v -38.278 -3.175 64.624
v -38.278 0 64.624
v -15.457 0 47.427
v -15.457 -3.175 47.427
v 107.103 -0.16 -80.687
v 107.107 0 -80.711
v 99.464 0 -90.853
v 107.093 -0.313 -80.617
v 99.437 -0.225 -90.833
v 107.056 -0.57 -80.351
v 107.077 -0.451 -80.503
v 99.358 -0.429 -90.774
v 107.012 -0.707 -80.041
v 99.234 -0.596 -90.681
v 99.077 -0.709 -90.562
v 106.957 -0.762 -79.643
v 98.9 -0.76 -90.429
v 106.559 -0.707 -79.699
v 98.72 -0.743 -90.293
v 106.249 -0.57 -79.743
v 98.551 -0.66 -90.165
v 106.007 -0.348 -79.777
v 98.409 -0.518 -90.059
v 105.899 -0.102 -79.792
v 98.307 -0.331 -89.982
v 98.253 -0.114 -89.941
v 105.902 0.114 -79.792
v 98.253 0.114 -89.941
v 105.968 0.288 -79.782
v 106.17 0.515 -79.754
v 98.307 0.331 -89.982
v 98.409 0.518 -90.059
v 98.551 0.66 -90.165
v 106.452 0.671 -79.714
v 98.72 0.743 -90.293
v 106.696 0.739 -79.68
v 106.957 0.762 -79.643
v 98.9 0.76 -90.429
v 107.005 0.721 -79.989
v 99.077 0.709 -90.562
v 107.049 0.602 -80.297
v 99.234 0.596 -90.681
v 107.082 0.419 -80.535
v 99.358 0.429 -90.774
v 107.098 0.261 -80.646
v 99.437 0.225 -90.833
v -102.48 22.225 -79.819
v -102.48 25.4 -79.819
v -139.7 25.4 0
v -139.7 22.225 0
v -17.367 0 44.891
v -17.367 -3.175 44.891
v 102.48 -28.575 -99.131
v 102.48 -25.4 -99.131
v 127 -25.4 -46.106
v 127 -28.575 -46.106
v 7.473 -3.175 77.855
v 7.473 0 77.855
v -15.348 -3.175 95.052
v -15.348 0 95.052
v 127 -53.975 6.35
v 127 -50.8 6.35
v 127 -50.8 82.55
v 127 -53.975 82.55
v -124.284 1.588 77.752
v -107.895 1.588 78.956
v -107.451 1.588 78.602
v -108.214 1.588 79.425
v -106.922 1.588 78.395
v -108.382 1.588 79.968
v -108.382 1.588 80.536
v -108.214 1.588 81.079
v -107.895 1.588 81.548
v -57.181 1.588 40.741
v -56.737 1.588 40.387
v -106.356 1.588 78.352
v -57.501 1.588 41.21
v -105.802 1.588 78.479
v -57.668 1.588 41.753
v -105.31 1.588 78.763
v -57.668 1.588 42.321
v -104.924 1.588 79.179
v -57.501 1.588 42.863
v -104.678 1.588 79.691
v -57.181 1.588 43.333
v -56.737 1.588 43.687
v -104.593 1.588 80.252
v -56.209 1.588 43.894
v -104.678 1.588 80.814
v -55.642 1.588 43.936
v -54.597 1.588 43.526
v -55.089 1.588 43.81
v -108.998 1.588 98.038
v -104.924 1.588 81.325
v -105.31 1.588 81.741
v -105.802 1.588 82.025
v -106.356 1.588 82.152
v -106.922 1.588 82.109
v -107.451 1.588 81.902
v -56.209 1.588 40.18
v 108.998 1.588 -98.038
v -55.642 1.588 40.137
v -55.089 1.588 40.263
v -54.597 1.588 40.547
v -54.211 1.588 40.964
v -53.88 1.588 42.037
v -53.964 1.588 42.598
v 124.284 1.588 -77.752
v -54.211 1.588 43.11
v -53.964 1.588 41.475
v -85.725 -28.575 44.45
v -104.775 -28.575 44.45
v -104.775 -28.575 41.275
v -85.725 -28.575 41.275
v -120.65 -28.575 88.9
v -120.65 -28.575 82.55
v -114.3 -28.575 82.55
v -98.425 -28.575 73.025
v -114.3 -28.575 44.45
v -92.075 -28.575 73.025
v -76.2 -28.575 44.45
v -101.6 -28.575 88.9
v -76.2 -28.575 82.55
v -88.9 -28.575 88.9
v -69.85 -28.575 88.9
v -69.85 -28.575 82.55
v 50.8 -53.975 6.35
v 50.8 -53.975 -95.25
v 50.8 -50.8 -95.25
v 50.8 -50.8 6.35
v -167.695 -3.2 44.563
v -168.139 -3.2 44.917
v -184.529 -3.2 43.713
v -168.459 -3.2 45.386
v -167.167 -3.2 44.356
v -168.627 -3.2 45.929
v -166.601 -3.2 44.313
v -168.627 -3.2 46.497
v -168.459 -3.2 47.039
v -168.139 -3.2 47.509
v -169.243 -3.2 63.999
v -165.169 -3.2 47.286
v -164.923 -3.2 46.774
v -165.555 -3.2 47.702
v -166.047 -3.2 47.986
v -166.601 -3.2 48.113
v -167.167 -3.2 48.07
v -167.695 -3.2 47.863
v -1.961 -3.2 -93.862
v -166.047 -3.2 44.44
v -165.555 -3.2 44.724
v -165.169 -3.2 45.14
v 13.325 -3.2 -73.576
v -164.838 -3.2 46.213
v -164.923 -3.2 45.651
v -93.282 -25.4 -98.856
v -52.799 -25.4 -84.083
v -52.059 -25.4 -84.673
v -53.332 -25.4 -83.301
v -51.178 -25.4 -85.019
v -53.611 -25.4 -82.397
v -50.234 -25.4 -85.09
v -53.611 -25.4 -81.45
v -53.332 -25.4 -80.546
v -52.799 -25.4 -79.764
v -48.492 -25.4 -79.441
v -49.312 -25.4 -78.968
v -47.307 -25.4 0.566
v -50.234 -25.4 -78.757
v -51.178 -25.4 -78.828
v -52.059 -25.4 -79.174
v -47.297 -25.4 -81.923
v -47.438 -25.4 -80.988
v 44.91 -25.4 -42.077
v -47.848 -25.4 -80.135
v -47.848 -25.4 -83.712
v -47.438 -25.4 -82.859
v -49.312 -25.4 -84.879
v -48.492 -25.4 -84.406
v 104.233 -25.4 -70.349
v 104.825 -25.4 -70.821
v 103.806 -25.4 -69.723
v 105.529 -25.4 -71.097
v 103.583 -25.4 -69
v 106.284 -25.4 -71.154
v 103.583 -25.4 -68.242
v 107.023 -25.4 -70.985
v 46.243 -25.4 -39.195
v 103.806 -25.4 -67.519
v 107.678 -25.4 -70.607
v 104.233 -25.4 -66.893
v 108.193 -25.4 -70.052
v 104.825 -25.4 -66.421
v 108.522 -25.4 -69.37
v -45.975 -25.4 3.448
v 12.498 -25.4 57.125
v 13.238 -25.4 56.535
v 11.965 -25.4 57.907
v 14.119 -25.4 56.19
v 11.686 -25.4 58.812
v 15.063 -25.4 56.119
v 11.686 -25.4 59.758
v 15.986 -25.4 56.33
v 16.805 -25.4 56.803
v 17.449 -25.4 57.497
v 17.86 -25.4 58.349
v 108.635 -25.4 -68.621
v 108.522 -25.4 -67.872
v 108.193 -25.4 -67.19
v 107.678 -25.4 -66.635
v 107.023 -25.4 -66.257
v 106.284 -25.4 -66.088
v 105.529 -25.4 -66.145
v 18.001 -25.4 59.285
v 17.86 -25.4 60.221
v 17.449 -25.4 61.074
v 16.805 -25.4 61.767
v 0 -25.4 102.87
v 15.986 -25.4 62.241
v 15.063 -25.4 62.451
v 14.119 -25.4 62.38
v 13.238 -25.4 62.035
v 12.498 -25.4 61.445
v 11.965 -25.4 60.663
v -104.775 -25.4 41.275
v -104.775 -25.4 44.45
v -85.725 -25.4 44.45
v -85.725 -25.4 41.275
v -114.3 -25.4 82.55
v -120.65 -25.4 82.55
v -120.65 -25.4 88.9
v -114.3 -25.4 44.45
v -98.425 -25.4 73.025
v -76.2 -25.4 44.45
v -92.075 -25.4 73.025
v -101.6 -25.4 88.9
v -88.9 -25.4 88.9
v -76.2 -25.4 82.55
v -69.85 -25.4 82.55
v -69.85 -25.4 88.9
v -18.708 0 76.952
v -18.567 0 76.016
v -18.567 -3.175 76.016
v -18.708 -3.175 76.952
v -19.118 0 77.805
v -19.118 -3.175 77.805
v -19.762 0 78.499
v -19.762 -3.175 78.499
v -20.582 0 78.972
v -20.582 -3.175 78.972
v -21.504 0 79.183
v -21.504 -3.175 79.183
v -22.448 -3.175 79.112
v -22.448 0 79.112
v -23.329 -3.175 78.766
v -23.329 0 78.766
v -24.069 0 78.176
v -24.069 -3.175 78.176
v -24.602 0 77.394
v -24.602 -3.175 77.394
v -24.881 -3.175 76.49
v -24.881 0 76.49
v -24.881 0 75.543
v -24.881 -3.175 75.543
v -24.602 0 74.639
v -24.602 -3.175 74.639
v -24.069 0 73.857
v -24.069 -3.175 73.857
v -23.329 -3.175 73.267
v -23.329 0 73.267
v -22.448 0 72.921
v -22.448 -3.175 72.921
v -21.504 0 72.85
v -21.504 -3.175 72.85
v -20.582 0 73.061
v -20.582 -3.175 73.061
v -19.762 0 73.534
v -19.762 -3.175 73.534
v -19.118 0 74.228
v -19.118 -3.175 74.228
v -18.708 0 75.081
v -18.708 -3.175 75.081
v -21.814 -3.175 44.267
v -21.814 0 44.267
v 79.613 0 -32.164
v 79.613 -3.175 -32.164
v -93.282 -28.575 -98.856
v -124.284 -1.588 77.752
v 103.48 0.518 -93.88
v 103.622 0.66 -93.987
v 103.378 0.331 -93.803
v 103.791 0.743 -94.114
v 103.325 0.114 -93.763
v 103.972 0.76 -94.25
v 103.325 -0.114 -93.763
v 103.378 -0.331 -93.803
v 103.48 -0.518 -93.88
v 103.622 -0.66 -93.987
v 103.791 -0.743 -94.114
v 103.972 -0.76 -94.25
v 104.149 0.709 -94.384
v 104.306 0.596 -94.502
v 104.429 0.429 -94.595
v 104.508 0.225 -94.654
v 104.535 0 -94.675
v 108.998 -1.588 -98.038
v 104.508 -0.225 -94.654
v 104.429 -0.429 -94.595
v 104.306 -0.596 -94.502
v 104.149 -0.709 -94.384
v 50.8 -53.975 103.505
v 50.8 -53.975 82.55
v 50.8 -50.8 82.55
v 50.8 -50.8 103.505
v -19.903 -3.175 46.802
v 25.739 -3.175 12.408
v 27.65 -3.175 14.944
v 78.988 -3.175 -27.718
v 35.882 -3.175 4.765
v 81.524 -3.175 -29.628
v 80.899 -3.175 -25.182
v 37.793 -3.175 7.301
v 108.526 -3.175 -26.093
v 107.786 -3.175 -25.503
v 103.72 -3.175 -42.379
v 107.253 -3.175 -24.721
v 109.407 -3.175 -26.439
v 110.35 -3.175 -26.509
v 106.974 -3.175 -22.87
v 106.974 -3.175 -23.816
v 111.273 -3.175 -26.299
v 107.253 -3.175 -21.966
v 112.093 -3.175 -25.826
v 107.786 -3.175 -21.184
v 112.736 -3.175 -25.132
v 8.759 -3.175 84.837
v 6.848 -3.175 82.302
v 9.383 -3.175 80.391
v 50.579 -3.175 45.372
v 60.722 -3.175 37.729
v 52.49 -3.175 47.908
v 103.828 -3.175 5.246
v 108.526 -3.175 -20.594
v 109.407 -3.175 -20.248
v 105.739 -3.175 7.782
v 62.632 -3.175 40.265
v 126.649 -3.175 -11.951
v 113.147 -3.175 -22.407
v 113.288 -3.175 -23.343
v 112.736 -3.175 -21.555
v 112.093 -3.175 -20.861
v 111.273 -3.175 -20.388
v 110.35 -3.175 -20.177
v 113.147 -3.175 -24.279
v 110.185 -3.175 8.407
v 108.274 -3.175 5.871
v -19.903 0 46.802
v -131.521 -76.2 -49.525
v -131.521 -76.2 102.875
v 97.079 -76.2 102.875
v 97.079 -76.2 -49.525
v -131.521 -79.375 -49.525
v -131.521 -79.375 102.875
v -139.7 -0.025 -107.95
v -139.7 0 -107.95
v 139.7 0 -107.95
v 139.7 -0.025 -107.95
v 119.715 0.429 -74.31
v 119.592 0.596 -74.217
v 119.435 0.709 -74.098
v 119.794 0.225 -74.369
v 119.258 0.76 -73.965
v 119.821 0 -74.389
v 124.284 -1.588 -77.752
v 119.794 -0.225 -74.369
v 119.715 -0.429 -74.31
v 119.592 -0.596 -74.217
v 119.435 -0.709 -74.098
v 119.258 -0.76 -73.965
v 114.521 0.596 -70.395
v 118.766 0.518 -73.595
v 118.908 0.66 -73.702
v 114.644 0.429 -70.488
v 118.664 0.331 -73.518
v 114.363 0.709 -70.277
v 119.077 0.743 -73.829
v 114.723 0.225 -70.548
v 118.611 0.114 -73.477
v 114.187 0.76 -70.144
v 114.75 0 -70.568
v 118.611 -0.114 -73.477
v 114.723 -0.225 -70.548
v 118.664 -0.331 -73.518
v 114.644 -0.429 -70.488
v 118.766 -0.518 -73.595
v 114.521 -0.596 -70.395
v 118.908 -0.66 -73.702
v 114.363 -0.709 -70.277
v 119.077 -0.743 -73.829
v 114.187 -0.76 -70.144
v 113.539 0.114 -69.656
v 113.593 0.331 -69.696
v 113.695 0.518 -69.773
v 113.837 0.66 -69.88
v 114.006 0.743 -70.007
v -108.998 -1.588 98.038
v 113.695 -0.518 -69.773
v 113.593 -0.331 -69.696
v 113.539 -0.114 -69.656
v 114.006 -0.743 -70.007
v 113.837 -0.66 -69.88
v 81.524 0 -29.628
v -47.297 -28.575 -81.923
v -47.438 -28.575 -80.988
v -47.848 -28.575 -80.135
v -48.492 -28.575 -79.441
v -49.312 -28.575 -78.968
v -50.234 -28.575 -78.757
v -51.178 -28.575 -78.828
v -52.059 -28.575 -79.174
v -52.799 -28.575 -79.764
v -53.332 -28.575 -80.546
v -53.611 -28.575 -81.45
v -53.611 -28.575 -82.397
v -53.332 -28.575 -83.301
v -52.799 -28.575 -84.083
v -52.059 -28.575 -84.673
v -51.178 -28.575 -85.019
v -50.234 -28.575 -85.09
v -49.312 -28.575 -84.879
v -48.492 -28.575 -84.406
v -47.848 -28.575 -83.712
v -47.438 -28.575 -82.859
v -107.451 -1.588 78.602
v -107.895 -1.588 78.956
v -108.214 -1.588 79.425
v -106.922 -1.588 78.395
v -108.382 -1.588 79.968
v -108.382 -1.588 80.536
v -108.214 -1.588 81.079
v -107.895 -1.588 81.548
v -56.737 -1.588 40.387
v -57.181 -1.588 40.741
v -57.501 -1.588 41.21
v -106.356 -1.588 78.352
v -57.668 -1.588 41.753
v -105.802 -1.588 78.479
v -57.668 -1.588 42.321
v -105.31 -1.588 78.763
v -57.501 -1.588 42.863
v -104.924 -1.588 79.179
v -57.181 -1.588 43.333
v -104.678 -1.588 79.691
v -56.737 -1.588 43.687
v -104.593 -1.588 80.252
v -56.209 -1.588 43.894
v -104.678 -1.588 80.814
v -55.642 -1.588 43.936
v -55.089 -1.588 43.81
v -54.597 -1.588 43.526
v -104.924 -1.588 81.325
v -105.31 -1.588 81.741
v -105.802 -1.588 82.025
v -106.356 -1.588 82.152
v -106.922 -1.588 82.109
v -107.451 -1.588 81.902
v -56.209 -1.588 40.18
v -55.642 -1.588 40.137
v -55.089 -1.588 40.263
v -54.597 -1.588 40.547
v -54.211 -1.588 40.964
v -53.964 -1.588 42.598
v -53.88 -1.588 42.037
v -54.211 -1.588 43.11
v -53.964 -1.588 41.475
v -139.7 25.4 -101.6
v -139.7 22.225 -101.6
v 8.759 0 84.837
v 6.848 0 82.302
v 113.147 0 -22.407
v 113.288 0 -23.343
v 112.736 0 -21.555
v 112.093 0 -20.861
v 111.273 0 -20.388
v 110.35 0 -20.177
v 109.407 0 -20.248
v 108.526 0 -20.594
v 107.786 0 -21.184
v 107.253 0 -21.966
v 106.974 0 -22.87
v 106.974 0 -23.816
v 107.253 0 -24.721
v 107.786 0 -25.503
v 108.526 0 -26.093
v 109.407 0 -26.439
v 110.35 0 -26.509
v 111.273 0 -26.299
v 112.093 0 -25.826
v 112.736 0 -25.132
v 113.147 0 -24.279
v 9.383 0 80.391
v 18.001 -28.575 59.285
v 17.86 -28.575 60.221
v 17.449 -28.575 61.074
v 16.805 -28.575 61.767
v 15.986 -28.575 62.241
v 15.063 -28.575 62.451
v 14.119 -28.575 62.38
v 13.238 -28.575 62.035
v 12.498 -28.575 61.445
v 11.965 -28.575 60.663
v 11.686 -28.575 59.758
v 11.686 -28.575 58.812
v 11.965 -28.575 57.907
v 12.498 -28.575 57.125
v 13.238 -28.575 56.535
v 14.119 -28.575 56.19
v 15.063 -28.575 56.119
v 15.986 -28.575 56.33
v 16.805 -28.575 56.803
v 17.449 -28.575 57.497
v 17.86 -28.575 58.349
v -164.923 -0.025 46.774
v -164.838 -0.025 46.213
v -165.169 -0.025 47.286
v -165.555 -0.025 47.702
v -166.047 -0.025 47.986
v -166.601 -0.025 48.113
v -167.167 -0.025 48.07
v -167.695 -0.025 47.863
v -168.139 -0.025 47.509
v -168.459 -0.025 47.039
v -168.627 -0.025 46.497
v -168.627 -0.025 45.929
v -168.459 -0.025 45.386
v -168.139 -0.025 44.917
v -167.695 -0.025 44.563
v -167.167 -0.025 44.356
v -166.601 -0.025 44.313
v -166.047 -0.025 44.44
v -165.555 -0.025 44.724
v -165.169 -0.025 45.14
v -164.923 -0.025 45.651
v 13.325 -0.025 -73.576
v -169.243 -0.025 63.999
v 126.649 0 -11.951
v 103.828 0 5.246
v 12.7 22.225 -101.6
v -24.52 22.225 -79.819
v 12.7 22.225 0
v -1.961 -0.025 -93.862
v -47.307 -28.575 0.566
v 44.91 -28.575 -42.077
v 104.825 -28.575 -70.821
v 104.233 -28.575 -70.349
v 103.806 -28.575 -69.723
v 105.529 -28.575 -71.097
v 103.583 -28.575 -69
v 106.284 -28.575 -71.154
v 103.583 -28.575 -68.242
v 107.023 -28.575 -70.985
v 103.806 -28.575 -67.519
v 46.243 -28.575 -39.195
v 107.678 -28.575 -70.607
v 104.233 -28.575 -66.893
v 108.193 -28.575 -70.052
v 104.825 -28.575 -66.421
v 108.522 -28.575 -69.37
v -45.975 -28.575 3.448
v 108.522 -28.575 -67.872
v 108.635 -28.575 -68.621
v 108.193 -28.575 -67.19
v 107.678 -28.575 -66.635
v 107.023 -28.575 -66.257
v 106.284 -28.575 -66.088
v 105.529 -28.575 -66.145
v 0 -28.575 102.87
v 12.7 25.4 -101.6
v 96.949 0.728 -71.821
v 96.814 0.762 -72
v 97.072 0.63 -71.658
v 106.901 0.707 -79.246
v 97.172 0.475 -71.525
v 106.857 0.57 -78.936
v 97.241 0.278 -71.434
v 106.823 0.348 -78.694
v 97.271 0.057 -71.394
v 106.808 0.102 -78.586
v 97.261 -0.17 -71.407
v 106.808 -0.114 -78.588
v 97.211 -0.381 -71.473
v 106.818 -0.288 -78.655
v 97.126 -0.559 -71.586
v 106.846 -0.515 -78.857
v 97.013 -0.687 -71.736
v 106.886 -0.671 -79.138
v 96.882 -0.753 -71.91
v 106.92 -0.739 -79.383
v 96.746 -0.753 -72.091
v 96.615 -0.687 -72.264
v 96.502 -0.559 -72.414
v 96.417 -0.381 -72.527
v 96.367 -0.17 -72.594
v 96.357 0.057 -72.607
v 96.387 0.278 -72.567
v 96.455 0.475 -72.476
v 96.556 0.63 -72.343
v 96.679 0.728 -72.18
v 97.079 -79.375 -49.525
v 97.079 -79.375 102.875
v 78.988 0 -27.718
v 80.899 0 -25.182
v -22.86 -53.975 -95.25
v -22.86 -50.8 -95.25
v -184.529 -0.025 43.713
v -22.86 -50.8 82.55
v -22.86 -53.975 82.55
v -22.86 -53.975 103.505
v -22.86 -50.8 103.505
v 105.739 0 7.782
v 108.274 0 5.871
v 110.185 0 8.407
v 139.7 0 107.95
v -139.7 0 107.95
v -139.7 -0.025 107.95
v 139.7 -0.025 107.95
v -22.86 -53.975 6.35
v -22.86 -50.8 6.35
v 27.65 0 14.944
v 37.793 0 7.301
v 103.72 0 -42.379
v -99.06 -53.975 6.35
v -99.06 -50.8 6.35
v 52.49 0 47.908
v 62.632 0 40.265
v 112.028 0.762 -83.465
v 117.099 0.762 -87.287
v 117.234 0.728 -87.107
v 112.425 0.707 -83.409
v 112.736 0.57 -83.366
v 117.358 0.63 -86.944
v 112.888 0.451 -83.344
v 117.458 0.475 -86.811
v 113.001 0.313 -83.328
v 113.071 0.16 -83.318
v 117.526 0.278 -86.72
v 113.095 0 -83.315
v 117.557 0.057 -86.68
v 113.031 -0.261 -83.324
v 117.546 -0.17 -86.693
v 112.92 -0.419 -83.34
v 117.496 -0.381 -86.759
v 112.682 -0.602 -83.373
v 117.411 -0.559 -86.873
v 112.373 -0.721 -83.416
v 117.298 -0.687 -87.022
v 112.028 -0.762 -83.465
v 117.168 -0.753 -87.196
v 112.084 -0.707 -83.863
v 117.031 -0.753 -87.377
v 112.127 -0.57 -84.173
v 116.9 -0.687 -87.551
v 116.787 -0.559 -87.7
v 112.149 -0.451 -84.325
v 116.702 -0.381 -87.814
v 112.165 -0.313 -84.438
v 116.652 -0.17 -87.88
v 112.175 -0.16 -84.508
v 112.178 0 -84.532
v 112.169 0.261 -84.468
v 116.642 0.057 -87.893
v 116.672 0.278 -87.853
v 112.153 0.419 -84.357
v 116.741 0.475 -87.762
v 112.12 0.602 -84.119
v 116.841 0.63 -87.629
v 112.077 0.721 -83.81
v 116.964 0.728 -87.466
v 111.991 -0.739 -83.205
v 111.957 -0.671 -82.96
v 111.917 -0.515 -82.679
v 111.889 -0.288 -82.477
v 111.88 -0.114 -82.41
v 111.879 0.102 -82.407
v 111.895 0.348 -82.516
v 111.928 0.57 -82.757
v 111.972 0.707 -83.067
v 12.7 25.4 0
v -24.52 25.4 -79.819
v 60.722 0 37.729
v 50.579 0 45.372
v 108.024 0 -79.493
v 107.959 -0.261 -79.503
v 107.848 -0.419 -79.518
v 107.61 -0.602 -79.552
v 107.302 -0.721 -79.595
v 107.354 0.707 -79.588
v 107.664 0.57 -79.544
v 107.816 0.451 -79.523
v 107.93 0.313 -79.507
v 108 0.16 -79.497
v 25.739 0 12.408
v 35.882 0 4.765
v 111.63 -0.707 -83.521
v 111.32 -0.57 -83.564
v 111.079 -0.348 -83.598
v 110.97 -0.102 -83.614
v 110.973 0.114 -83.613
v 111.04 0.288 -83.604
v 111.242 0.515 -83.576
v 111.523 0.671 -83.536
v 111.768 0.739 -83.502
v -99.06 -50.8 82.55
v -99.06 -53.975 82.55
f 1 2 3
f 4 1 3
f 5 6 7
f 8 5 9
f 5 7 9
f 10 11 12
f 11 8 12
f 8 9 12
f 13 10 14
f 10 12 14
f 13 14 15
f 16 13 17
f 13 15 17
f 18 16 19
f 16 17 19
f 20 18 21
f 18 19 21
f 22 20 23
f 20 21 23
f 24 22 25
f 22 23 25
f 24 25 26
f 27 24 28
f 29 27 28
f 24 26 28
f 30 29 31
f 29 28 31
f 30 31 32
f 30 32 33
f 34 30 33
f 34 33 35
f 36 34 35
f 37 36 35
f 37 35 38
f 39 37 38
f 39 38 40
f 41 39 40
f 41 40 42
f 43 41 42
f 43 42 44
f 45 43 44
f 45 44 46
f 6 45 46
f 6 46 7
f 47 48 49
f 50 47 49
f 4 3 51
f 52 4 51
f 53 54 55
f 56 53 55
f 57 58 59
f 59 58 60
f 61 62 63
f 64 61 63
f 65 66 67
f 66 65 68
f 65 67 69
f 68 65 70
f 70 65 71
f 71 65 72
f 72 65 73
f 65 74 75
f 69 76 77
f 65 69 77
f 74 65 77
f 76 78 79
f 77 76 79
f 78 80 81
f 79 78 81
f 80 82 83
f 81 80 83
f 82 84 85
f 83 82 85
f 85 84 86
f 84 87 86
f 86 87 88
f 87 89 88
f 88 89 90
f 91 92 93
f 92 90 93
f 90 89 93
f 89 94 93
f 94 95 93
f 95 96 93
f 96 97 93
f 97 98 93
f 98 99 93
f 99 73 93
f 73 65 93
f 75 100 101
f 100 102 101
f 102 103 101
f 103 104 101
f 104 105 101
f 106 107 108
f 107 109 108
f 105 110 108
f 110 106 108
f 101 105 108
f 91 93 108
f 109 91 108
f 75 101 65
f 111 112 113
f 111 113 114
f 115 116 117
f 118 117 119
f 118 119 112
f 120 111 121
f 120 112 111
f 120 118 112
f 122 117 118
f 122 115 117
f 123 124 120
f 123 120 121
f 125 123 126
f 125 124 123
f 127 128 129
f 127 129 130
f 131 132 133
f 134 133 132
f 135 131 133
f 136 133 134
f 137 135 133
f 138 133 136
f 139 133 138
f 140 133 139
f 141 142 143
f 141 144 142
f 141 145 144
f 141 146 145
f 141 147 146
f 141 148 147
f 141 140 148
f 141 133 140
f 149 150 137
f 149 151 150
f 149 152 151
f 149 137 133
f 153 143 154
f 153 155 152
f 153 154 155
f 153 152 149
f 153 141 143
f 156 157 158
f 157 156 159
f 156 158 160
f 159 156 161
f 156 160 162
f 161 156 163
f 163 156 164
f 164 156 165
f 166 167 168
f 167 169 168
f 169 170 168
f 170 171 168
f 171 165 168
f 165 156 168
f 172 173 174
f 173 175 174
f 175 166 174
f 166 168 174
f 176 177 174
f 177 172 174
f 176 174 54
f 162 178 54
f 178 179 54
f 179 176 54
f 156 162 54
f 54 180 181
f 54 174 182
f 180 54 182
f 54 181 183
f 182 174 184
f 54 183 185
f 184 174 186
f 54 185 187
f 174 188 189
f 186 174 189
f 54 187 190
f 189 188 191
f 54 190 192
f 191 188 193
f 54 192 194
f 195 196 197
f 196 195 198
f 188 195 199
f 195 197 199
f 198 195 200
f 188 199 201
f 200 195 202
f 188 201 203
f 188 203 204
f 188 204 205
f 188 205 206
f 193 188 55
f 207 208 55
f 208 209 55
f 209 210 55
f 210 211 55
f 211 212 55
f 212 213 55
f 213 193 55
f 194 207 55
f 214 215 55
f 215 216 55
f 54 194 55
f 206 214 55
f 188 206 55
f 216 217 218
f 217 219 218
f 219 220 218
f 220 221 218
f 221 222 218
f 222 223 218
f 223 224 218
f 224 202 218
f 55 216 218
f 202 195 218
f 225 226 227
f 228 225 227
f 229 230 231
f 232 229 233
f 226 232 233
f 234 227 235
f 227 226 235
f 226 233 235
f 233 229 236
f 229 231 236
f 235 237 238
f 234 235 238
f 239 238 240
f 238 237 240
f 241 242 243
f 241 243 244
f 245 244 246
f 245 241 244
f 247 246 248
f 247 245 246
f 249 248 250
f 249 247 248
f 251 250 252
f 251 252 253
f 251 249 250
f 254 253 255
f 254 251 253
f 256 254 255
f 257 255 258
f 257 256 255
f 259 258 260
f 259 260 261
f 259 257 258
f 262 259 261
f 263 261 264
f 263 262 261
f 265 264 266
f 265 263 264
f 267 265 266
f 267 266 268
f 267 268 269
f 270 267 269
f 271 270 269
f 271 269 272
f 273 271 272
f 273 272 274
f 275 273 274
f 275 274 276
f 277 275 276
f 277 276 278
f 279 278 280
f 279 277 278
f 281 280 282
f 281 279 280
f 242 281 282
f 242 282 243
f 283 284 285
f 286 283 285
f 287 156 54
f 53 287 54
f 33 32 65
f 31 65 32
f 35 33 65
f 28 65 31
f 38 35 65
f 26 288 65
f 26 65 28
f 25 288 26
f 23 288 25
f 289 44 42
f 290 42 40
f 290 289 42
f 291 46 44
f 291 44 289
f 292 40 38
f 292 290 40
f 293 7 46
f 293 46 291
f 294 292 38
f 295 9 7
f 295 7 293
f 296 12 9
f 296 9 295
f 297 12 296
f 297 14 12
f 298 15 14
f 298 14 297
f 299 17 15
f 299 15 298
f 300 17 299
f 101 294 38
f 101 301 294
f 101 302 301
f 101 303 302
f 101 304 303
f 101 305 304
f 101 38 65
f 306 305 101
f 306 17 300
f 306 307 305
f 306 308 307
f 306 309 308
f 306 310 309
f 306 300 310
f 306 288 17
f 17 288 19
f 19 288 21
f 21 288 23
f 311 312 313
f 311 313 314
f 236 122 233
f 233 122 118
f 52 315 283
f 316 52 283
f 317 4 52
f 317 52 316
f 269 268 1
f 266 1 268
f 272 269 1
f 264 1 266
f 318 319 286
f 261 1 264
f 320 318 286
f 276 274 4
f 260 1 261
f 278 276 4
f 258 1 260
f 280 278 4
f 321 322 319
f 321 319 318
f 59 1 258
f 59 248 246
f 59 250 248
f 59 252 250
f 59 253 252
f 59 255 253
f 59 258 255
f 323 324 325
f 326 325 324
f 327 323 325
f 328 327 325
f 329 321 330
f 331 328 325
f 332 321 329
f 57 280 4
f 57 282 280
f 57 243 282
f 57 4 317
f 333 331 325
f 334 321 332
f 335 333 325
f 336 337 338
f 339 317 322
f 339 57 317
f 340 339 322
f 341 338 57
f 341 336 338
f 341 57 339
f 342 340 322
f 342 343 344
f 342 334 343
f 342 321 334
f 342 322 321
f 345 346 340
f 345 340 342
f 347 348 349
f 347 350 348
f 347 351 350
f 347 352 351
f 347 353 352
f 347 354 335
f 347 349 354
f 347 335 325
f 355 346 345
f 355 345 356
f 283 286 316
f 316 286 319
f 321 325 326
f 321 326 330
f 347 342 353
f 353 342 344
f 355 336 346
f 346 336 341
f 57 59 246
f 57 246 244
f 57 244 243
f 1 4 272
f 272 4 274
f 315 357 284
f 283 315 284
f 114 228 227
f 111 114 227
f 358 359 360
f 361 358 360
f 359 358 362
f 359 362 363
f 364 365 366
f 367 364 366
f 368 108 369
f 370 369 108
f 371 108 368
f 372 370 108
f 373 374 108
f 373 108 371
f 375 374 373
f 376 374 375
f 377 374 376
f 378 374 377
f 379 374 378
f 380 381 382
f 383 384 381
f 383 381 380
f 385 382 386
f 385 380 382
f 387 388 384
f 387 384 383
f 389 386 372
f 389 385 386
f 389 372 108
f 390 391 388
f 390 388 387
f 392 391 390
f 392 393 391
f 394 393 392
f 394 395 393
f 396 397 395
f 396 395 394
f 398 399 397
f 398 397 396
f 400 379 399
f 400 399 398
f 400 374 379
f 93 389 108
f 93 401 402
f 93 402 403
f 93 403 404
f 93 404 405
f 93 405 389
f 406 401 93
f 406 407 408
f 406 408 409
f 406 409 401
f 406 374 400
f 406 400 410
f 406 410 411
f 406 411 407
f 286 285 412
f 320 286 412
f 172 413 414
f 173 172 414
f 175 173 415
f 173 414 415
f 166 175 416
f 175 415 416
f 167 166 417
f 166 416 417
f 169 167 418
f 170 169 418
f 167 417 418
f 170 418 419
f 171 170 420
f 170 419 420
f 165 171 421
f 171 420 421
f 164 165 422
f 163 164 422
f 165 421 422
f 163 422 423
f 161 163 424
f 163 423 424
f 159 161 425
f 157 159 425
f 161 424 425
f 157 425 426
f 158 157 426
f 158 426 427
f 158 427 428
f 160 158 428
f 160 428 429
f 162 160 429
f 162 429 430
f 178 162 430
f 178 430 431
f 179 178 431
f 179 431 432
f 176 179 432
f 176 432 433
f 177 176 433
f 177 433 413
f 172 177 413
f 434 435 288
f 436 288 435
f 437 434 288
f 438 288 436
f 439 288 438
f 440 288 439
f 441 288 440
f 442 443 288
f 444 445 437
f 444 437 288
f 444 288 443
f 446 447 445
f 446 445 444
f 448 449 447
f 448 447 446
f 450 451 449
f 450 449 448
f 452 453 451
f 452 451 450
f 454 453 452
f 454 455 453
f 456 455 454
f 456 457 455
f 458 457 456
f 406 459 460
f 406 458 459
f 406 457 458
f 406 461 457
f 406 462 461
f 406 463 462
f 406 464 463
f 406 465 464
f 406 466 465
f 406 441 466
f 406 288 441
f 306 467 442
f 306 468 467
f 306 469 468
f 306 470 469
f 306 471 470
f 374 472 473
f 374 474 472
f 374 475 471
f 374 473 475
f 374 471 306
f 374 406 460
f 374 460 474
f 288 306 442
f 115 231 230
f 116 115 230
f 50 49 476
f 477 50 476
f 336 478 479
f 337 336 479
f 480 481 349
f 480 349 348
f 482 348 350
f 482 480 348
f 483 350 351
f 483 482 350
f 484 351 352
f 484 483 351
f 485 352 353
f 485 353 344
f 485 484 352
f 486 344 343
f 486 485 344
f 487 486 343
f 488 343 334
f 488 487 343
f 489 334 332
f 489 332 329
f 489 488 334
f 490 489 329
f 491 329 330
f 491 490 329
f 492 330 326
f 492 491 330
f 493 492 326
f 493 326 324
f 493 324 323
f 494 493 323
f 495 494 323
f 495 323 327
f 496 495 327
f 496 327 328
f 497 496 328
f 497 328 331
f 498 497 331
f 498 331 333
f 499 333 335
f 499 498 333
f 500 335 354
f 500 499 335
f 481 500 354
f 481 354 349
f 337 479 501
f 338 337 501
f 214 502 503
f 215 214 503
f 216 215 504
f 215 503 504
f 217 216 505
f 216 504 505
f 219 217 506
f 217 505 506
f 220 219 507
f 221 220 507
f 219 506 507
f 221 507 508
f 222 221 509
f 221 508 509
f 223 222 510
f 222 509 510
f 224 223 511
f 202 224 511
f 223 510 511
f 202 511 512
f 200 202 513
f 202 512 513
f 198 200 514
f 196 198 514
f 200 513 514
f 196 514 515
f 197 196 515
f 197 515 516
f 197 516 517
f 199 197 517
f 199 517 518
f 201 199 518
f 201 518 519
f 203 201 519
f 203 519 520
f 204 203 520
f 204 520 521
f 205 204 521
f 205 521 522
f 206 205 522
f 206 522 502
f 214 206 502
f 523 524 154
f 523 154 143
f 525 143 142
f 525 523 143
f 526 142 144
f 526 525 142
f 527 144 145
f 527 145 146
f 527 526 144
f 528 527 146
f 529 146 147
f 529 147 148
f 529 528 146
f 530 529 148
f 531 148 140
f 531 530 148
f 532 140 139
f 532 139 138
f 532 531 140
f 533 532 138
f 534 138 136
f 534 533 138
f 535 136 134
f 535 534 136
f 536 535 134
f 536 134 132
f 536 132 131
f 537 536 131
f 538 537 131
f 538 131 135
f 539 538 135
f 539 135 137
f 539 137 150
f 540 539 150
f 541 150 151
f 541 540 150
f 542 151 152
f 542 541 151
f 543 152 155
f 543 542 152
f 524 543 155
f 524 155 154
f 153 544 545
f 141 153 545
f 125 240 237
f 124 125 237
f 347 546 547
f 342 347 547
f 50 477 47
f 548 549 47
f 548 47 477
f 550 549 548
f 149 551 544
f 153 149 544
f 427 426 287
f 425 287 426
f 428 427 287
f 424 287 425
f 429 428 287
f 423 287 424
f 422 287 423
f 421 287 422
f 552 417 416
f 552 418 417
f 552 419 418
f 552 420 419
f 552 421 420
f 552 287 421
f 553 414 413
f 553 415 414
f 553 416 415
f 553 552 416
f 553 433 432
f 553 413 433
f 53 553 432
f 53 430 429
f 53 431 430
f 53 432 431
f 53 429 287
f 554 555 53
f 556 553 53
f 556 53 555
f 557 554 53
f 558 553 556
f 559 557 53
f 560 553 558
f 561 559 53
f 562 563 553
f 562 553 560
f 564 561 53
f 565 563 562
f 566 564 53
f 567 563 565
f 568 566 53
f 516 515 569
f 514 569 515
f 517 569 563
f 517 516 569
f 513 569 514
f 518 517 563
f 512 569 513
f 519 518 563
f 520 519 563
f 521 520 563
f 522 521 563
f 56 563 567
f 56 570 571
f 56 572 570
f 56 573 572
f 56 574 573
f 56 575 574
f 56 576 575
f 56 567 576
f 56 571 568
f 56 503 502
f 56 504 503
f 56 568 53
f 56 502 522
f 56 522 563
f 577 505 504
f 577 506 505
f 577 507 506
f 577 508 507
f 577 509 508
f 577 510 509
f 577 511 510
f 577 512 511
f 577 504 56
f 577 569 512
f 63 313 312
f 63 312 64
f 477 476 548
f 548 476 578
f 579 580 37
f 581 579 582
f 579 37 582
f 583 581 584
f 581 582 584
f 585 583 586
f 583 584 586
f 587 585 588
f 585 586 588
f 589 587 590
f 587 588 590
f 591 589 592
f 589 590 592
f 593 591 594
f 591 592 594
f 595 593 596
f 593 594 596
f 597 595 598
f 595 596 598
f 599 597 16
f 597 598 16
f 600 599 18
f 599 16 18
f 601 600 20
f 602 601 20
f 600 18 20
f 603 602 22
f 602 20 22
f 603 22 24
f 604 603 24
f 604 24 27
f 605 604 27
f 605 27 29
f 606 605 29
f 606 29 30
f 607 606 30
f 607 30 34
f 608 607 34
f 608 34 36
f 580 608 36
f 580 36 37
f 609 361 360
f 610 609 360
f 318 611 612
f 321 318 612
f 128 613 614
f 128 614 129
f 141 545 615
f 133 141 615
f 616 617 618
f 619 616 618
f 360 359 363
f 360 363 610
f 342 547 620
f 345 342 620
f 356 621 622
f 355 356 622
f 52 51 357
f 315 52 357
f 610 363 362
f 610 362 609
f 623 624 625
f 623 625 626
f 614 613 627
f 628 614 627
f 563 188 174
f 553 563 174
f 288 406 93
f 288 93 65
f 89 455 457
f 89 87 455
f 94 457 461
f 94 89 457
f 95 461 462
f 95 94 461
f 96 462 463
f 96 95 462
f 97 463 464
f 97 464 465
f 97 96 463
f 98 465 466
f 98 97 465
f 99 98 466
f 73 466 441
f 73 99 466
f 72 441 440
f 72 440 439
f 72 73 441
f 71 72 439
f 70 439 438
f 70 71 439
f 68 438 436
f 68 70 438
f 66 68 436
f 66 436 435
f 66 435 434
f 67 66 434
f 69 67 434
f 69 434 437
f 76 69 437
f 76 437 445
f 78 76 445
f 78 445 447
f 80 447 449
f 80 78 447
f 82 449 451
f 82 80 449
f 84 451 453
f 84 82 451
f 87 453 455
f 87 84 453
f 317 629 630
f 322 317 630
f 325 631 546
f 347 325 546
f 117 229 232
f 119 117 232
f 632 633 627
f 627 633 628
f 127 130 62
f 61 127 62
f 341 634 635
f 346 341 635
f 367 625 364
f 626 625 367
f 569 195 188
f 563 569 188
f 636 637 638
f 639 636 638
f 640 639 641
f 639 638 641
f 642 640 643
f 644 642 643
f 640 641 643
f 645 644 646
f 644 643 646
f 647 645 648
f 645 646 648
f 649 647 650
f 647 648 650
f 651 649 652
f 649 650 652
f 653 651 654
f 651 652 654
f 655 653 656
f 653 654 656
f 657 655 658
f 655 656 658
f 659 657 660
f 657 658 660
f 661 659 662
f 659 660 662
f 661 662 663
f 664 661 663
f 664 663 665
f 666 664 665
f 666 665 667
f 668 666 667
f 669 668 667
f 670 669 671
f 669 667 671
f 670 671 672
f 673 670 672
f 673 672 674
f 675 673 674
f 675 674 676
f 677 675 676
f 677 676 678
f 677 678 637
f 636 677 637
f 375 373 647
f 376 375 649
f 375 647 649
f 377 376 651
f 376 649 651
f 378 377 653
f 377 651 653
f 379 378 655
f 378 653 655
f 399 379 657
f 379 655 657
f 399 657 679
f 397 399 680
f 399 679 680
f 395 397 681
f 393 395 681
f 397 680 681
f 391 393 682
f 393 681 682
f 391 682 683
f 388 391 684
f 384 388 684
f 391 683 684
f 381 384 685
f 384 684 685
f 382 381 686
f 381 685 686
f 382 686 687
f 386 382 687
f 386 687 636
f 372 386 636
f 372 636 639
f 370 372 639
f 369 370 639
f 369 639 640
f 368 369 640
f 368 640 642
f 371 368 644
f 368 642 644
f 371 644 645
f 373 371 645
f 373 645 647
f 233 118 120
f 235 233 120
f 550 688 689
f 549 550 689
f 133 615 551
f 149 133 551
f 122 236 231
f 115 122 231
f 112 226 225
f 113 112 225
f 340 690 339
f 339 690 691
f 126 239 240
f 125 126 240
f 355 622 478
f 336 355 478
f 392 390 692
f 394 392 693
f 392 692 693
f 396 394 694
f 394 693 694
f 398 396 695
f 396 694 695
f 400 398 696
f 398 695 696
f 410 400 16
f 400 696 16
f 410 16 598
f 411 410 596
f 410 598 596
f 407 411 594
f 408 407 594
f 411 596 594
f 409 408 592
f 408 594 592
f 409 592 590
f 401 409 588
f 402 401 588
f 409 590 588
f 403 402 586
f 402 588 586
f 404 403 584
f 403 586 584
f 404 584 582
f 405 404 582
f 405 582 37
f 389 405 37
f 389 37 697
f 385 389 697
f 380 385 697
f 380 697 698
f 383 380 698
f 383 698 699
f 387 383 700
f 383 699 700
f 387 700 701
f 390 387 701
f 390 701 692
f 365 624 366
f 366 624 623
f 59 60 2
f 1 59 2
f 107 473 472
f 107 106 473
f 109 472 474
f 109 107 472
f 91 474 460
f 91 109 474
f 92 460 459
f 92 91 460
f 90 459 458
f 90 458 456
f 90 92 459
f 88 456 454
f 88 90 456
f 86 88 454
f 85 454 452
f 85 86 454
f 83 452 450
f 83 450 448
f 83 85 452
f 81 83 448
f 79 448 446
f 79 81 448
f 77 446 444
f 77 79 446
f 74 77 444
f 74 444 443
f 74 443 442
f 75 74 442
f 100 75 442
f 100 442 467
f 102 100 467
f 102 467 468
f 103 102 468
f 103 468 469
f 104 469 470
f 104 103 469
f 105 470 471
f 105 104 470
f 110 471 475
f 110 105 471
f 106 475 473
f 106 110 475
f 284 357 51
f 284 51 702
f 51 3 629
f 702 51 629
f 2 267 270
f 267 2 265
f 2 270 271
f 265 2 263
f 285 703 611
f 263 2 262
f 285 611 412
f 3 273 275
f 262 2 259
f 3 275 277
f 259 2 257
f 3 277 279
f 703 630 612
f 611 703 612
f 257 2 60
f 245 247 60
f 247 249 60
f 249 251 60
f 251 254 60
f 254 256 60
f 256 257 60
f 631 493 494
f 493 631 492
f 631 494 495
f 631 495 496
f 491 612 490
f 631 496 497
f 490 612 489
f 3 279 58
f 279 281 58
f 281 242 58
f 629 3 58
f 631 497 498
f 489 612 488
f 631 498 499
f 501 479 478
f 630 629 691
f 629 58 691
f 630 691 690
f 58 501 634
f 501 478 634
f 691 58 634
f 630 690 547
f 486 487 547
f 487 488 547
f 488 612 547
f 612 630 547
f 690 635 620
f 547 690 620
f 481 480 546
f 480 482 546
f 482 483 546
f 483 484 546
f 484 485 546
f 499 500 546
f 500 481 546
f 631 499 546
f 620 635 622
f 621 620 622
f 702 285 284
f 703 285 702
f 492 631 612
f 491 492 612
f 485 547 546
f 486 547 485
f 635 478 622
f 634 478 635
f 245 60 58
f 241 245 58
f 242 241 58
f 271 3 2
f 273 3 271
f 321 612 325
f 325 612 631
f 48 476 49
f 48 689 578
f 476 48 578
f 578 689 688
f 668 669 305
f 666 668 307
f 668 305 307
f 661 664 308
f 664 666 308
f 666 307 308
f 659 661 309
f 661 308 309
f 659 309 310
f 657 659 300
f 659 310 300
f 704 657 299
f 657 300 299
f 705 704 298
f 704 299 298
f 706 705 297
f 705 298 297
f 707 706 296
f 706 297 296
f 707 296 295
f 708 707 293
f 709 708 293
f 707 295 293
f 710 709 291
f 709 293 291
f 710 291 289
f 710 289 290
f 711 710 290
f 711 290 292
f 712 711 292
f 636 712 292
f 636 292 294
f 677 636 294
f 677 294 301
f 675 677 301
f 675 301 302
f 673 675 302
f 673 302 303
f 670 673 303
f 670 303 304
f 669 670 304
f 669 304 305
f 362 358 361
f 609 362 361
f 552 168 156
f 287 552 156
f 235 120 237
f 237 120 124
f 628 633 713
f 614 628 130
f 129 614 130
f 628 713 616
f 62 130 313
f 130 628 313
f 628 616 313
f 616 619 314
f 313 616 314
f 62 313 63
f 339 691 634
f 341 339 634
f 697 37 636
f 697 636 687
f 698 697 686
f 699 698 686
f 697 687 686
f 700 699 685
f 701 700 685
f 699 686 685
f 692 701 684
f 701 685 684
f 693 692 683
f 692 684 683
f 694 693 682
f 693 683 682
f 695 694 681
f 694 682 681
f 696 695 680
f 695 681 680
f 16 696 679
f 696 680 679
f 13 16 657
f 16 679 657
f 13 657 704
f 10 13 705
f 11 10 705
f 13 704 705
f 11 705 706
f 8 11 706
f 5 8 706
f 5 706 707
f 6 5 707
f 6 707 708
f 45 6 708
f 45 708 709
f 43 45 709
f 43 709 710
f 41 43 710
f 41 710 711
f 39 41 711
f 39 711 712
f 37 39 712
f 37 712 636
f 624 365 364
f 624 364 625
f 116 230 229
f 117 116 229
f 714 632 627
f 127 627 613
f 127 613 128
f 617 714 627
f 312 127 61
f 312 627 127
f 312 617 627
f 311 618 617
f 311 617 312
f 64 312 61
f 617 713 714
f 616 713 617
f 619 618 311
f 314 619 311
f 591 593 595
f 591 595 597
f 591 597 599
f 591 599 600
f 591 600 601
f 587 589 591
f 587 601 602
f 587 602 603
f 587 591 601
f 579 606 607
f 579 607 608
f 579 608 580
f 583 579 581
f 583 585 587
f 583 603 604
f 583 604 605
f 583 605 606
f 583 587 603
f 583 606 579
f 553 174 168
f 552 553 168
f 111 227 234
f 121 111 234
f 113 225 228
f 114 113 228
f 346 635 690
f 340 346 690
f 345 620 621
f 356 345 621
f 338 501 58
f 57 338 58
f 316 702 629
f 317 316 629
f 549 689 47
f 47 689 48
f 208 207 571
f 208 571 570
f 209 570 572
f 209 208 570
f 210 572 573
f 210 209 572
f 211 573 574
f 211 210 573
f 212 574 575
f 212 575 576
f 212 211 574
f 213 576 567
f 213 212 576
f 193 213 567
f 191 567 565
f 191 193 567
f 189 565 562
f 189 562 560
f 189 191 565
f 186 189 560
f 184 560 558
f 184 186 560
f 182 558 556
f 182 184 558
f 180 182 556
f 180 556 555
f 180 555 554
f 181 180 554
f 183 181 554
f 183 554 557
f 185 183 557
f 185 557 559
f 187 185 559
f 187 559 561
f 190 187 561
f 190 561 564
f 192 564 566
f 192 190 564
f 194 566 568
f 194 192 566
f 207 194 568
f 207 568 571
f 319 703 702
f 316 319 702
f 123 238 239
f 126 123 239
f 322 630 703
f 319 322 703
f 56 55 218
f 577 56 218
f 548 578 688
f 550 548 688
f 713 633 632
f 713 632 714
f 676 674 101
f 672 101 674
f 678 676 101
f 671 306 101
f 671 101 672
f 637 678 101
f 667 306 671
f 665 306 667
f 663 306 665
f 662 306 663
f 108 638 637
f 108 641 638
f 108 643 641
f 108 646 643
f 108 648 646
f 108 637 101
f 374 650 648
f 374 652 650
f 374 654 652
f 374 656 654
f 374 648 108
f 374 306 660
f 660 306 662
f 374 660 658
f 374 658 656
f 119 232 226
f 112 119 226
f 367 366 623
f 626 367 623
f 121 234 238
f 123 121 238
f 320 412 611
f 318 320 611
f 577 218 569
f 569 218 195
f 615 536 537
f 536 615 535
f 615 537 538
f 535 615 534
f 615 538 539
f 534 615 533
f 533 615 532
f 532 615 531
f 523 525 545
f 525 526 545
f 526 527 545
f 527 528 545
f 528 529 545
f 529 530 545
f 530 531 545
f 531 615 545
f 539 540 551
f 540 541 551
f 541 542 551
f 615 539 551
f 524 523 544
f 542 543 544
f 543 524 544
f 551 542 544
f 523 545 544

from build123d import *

# Parameters (mm, degrees)
F1_R      = 1.905
F2_DEPTH  = 1.5875
F4_R      = 2.54
F5_DEPTH  = 3.175
F7_DEPTH  = 3.175
F8_R      = 3.175
F9_DEPTH  = 3.175
F12_DEPTH = 3.175
F14_W     = 226.06
F14_H     = 76.2
F15_DEPTH = 3.175
F17_DEPTH = 53.976
F19_W     = 228.6
F19_H     = 152.4
F20_DEPTH = 3.175
F21_W     = 73.66
F21_H     = 198.755
F22_DEPTH = 3.175
F23_R     = 3.175
F24_DEPTH = 53.976
F0_W      = 279.4
F0_H      = 215.9
F25_DEPTH = 0.0254
F26_R     = 1.905
F27_DEPTH = 3.175
F28_R     = 0.762
F29_DEPTH = 25.4
F30_R     = 0.762
F31_DEPTH = 182.9872620439


with BuildPart() as f2:
    # F1 (on Front) → F2 (new body, symmetric)
    with BuildSketch(Plane.XZ):
        Polygon((124.2837670364, -77.7524131538), (-108.9976654484, 98.037755109), (-124.2837670364, 77.7524131538), (108.9976654484, -98.037755109), align=None)
        with Locations((-55.7846903768, 42.0367793672)):
            Circle(F1_R, mode=Mode.SUBTRACT)
        with Locations((-106.4980452648, 80.2520333373)):
            Circle(F1_R, mode=Mode.SUBTRACT)
    extrude(amount=F2_DEPTH, both=True)

    # F28 (on face) → F29 (cut)
    with BuildSketch(Plane(origin=(116.6407162424, 0, -87.8950841314), x_dir=(0, 1, 0), z_dir=(0.79863551, 0, -0.6018150232))):
        with Locations((0, 0.762)):
            Circle(F28_R)
    extrude(amount=-F29_DEPTH, mode=Mode.SUBTRACT)

    # F30 (on face) → F31 (cut, through all)
    with BuildSketch(Plane(origin=(-7.643050794, 0, -10.1426709776), x_dir=(0.79863551, 0, -0.6018150232), z_dir=(-0.6018150232, 0, -0.79863551))):
        with Locations((139.7, 0)):
            Circle(F30_R)
        with Locations((133.35, 0)):
            Circle(F30_R)
    extrude(amount=-F31_DEPTH, mode=Mode.SUBTRACT)


with BuildPart() as f5:
    # F4 (on offset) → F5 (new body)
    with BuildSketch(Plane.XZ.offset(25.4)):
        Polygon((127, -46.1061968403), (0, 102.87), (-45.9747141485, 3.4477209816), (46.2430518976, -39.1954921416), (44.9104514875, -42.0772973306), (-47.3073145586, 0.5659157926), (-93.2820287071, -98.8563632258), (102.4801524541, -99.1314123168), align=None)
        with Locations((106.0946606603, -68.6210033482)):
            Circle(F4_R, mode=Mode.SUBTRACT)
    extrude(amount=F5_DEPTH)

    # F23 (on face) → F24 (cut, through all)
    with BuildSketch(Plane.XZ.offset(28.575)):
        with Locations((-50.4716725116, -81.9234128429)):
            Circle(F23_R)
        with Locations((14.8257475833, 59.2850414151)):
            Circle(F23_R)
    extrude(amount=-F24_DEPTH, mode=Mode.SUBTRACT)


with BuildPart() as f7:
    # F6 (on offset) → F7 (new body)
    with BuildSketch(Plane.XZ.offset(25.4)):
        Polygon((-69.85, 88.9), (-120.65, 88.9), (-120.65, 82.55), (-114.3, 82.55), (-114.3, 44.45), (-104.775, 44.45), (-104.775, 41.275), (-85.725, 41.275), (-85.725, 44.45), (-76.2, 44.45), (-76.2, 82.55), (-69.85, 82.55), align=None)
    extrude(amount=F7_DEPTH)

    # F16 (on face) → F17 (cut, through all)
    with BuildSketch(Plane.XZ.offset(28.575)):
        Polygon((-95.25, 88.9), (-101.6, 88.9), (-98.425, 73.025), (-95.25, 73.025), (-92.075, 73.025), (-88.9, 88.9), align=None)
    extrude(amount=-F17_DEPTH, mode=Mode.SUBTRACT)


with BuildPart() as f9:
    # F8 (on Front) → F9 (new body)
    with BuildSketch(Plane.XZ):
        Polygon((-19.9029344652, 46.8021825923), (-21.8136971637, 44.2665148479), (79.6130126123, -32.1639930924), (81.5237753108, -29.628325348), (78.9881075664, -27.7175626495), (80.8988702649, -25.1818949051), (103.7198799645, -42.3787591916), (126.6490323466, -11.9507462588), (103.828022647, 5.2461180277), (105.7387853455, 7.7817857721), (108.2744530899, 5.8710230736), (110.1852157884, 8.406690818), (8.7585060124, 84.8371987583), (6.8477433139, 82.3015310139), (9.3834110583, 80.3907683154), (7.4726483598, 77.855100571), (-15.3483613398, 95.0519648576), (-38.2775137219, 64.6239519248), (-15.4565040223, 47.4270876382), (-17.3672667208, 44.8914198938), align=None)
        Polygon((27.6498476325, 14.9441217636), (37.7925186101, 7.3010709696), (35.8817559116, 4.7654032252), (25.739084934, 12.4084540192), align=None, mode=Mode.SUBTRACT)
        with Locations((110.1131206668, -23.3432273282)):
            Circle(F8_R, mode=Mode.SUBTRACT)
        with Locations((-21.741602042, 76.0164329942)):
            Circle(F8_R, mode=Mode.SUBTRACT)
        Polygon((50.5790000146, 45.3721346964), (52.4897627131, 47.9078024408), (62.6324336907, 40.2647516468), (60.7216709922, 37.7290839024), align=None, mode=Mode.SUBTRACT)
    extrude(amount=F9_DEPTH)


with BuildPart() as f12:
    # F11 (on offset) → F12 (new body)
    with BuildSketch(Plane.XZ.offset(-25.4)):
        Polygon((-139.7, -101.6), (12.7, -101.6), (12.7, 0), (-24.5201073247, -79.81877774), (-102.4798926753, -79.81877774), (-139.7, 0), align=None)
    extrude(amount=F12_DEPTH)


with BuildPart() as f15:
    # F14 (on offset) → F15 (new body)
    with BuildSketch(Plane.XZ.offset(50.8)):
        with Locations((13.97, 44.45)):
            Rectangle(F14_W, F14_H)
    extrude(amount=F15_DEPTH)

    # F21 (on face) → F22 (join)
    with BuildSketch(Plane.XZ.offset(53.975)):
        with Locations((13.97, 4.1275)):
            Rectangle(F21_W, F21_H)
    extrude(amount=-F22_DEPTH)


with BuildPart() as f20:
    # F19 (on offset) → F20 (new body)
    with BuildSketch(Plane.XZ.offset(76.2)):
        with Locations((-17.2213017941, 26.6749513012)):
            Rectangle(F19_W, F19_H)
    extrude(amount=F20_DEPTH)


with BuildPart() as f25:
    # F0 (on Front) → F25 (new body)
    with BuildSketch(Plane.XZ):
        Rectangle(F0_W, F0_H)
    extrude(amount=F25_DEPTH)


with BuildPart() as f27:
    # F26 (on face) → F27 (new body)
    with BuildSketch(Plane.XZ.offset(0.0254)):
        Polygon((13.3254593266, -73.5762905356), (-169.2426182702, 63.998623757), (-184.5287198583, 43.7132818017), (-1.9606422615, -93.8616324908), align=None)
        with Locations((-166.7429980867, 46.2129019853)):
            Circle(F26_R, mode=Mode.SUBTRACT)
    extrude(amount=F27_DEPTH)


solid = Compound([f2.part, f5.part, f7.part, f9.part, f12.part, f15.part, f20.part, f25.part, f27.part])
